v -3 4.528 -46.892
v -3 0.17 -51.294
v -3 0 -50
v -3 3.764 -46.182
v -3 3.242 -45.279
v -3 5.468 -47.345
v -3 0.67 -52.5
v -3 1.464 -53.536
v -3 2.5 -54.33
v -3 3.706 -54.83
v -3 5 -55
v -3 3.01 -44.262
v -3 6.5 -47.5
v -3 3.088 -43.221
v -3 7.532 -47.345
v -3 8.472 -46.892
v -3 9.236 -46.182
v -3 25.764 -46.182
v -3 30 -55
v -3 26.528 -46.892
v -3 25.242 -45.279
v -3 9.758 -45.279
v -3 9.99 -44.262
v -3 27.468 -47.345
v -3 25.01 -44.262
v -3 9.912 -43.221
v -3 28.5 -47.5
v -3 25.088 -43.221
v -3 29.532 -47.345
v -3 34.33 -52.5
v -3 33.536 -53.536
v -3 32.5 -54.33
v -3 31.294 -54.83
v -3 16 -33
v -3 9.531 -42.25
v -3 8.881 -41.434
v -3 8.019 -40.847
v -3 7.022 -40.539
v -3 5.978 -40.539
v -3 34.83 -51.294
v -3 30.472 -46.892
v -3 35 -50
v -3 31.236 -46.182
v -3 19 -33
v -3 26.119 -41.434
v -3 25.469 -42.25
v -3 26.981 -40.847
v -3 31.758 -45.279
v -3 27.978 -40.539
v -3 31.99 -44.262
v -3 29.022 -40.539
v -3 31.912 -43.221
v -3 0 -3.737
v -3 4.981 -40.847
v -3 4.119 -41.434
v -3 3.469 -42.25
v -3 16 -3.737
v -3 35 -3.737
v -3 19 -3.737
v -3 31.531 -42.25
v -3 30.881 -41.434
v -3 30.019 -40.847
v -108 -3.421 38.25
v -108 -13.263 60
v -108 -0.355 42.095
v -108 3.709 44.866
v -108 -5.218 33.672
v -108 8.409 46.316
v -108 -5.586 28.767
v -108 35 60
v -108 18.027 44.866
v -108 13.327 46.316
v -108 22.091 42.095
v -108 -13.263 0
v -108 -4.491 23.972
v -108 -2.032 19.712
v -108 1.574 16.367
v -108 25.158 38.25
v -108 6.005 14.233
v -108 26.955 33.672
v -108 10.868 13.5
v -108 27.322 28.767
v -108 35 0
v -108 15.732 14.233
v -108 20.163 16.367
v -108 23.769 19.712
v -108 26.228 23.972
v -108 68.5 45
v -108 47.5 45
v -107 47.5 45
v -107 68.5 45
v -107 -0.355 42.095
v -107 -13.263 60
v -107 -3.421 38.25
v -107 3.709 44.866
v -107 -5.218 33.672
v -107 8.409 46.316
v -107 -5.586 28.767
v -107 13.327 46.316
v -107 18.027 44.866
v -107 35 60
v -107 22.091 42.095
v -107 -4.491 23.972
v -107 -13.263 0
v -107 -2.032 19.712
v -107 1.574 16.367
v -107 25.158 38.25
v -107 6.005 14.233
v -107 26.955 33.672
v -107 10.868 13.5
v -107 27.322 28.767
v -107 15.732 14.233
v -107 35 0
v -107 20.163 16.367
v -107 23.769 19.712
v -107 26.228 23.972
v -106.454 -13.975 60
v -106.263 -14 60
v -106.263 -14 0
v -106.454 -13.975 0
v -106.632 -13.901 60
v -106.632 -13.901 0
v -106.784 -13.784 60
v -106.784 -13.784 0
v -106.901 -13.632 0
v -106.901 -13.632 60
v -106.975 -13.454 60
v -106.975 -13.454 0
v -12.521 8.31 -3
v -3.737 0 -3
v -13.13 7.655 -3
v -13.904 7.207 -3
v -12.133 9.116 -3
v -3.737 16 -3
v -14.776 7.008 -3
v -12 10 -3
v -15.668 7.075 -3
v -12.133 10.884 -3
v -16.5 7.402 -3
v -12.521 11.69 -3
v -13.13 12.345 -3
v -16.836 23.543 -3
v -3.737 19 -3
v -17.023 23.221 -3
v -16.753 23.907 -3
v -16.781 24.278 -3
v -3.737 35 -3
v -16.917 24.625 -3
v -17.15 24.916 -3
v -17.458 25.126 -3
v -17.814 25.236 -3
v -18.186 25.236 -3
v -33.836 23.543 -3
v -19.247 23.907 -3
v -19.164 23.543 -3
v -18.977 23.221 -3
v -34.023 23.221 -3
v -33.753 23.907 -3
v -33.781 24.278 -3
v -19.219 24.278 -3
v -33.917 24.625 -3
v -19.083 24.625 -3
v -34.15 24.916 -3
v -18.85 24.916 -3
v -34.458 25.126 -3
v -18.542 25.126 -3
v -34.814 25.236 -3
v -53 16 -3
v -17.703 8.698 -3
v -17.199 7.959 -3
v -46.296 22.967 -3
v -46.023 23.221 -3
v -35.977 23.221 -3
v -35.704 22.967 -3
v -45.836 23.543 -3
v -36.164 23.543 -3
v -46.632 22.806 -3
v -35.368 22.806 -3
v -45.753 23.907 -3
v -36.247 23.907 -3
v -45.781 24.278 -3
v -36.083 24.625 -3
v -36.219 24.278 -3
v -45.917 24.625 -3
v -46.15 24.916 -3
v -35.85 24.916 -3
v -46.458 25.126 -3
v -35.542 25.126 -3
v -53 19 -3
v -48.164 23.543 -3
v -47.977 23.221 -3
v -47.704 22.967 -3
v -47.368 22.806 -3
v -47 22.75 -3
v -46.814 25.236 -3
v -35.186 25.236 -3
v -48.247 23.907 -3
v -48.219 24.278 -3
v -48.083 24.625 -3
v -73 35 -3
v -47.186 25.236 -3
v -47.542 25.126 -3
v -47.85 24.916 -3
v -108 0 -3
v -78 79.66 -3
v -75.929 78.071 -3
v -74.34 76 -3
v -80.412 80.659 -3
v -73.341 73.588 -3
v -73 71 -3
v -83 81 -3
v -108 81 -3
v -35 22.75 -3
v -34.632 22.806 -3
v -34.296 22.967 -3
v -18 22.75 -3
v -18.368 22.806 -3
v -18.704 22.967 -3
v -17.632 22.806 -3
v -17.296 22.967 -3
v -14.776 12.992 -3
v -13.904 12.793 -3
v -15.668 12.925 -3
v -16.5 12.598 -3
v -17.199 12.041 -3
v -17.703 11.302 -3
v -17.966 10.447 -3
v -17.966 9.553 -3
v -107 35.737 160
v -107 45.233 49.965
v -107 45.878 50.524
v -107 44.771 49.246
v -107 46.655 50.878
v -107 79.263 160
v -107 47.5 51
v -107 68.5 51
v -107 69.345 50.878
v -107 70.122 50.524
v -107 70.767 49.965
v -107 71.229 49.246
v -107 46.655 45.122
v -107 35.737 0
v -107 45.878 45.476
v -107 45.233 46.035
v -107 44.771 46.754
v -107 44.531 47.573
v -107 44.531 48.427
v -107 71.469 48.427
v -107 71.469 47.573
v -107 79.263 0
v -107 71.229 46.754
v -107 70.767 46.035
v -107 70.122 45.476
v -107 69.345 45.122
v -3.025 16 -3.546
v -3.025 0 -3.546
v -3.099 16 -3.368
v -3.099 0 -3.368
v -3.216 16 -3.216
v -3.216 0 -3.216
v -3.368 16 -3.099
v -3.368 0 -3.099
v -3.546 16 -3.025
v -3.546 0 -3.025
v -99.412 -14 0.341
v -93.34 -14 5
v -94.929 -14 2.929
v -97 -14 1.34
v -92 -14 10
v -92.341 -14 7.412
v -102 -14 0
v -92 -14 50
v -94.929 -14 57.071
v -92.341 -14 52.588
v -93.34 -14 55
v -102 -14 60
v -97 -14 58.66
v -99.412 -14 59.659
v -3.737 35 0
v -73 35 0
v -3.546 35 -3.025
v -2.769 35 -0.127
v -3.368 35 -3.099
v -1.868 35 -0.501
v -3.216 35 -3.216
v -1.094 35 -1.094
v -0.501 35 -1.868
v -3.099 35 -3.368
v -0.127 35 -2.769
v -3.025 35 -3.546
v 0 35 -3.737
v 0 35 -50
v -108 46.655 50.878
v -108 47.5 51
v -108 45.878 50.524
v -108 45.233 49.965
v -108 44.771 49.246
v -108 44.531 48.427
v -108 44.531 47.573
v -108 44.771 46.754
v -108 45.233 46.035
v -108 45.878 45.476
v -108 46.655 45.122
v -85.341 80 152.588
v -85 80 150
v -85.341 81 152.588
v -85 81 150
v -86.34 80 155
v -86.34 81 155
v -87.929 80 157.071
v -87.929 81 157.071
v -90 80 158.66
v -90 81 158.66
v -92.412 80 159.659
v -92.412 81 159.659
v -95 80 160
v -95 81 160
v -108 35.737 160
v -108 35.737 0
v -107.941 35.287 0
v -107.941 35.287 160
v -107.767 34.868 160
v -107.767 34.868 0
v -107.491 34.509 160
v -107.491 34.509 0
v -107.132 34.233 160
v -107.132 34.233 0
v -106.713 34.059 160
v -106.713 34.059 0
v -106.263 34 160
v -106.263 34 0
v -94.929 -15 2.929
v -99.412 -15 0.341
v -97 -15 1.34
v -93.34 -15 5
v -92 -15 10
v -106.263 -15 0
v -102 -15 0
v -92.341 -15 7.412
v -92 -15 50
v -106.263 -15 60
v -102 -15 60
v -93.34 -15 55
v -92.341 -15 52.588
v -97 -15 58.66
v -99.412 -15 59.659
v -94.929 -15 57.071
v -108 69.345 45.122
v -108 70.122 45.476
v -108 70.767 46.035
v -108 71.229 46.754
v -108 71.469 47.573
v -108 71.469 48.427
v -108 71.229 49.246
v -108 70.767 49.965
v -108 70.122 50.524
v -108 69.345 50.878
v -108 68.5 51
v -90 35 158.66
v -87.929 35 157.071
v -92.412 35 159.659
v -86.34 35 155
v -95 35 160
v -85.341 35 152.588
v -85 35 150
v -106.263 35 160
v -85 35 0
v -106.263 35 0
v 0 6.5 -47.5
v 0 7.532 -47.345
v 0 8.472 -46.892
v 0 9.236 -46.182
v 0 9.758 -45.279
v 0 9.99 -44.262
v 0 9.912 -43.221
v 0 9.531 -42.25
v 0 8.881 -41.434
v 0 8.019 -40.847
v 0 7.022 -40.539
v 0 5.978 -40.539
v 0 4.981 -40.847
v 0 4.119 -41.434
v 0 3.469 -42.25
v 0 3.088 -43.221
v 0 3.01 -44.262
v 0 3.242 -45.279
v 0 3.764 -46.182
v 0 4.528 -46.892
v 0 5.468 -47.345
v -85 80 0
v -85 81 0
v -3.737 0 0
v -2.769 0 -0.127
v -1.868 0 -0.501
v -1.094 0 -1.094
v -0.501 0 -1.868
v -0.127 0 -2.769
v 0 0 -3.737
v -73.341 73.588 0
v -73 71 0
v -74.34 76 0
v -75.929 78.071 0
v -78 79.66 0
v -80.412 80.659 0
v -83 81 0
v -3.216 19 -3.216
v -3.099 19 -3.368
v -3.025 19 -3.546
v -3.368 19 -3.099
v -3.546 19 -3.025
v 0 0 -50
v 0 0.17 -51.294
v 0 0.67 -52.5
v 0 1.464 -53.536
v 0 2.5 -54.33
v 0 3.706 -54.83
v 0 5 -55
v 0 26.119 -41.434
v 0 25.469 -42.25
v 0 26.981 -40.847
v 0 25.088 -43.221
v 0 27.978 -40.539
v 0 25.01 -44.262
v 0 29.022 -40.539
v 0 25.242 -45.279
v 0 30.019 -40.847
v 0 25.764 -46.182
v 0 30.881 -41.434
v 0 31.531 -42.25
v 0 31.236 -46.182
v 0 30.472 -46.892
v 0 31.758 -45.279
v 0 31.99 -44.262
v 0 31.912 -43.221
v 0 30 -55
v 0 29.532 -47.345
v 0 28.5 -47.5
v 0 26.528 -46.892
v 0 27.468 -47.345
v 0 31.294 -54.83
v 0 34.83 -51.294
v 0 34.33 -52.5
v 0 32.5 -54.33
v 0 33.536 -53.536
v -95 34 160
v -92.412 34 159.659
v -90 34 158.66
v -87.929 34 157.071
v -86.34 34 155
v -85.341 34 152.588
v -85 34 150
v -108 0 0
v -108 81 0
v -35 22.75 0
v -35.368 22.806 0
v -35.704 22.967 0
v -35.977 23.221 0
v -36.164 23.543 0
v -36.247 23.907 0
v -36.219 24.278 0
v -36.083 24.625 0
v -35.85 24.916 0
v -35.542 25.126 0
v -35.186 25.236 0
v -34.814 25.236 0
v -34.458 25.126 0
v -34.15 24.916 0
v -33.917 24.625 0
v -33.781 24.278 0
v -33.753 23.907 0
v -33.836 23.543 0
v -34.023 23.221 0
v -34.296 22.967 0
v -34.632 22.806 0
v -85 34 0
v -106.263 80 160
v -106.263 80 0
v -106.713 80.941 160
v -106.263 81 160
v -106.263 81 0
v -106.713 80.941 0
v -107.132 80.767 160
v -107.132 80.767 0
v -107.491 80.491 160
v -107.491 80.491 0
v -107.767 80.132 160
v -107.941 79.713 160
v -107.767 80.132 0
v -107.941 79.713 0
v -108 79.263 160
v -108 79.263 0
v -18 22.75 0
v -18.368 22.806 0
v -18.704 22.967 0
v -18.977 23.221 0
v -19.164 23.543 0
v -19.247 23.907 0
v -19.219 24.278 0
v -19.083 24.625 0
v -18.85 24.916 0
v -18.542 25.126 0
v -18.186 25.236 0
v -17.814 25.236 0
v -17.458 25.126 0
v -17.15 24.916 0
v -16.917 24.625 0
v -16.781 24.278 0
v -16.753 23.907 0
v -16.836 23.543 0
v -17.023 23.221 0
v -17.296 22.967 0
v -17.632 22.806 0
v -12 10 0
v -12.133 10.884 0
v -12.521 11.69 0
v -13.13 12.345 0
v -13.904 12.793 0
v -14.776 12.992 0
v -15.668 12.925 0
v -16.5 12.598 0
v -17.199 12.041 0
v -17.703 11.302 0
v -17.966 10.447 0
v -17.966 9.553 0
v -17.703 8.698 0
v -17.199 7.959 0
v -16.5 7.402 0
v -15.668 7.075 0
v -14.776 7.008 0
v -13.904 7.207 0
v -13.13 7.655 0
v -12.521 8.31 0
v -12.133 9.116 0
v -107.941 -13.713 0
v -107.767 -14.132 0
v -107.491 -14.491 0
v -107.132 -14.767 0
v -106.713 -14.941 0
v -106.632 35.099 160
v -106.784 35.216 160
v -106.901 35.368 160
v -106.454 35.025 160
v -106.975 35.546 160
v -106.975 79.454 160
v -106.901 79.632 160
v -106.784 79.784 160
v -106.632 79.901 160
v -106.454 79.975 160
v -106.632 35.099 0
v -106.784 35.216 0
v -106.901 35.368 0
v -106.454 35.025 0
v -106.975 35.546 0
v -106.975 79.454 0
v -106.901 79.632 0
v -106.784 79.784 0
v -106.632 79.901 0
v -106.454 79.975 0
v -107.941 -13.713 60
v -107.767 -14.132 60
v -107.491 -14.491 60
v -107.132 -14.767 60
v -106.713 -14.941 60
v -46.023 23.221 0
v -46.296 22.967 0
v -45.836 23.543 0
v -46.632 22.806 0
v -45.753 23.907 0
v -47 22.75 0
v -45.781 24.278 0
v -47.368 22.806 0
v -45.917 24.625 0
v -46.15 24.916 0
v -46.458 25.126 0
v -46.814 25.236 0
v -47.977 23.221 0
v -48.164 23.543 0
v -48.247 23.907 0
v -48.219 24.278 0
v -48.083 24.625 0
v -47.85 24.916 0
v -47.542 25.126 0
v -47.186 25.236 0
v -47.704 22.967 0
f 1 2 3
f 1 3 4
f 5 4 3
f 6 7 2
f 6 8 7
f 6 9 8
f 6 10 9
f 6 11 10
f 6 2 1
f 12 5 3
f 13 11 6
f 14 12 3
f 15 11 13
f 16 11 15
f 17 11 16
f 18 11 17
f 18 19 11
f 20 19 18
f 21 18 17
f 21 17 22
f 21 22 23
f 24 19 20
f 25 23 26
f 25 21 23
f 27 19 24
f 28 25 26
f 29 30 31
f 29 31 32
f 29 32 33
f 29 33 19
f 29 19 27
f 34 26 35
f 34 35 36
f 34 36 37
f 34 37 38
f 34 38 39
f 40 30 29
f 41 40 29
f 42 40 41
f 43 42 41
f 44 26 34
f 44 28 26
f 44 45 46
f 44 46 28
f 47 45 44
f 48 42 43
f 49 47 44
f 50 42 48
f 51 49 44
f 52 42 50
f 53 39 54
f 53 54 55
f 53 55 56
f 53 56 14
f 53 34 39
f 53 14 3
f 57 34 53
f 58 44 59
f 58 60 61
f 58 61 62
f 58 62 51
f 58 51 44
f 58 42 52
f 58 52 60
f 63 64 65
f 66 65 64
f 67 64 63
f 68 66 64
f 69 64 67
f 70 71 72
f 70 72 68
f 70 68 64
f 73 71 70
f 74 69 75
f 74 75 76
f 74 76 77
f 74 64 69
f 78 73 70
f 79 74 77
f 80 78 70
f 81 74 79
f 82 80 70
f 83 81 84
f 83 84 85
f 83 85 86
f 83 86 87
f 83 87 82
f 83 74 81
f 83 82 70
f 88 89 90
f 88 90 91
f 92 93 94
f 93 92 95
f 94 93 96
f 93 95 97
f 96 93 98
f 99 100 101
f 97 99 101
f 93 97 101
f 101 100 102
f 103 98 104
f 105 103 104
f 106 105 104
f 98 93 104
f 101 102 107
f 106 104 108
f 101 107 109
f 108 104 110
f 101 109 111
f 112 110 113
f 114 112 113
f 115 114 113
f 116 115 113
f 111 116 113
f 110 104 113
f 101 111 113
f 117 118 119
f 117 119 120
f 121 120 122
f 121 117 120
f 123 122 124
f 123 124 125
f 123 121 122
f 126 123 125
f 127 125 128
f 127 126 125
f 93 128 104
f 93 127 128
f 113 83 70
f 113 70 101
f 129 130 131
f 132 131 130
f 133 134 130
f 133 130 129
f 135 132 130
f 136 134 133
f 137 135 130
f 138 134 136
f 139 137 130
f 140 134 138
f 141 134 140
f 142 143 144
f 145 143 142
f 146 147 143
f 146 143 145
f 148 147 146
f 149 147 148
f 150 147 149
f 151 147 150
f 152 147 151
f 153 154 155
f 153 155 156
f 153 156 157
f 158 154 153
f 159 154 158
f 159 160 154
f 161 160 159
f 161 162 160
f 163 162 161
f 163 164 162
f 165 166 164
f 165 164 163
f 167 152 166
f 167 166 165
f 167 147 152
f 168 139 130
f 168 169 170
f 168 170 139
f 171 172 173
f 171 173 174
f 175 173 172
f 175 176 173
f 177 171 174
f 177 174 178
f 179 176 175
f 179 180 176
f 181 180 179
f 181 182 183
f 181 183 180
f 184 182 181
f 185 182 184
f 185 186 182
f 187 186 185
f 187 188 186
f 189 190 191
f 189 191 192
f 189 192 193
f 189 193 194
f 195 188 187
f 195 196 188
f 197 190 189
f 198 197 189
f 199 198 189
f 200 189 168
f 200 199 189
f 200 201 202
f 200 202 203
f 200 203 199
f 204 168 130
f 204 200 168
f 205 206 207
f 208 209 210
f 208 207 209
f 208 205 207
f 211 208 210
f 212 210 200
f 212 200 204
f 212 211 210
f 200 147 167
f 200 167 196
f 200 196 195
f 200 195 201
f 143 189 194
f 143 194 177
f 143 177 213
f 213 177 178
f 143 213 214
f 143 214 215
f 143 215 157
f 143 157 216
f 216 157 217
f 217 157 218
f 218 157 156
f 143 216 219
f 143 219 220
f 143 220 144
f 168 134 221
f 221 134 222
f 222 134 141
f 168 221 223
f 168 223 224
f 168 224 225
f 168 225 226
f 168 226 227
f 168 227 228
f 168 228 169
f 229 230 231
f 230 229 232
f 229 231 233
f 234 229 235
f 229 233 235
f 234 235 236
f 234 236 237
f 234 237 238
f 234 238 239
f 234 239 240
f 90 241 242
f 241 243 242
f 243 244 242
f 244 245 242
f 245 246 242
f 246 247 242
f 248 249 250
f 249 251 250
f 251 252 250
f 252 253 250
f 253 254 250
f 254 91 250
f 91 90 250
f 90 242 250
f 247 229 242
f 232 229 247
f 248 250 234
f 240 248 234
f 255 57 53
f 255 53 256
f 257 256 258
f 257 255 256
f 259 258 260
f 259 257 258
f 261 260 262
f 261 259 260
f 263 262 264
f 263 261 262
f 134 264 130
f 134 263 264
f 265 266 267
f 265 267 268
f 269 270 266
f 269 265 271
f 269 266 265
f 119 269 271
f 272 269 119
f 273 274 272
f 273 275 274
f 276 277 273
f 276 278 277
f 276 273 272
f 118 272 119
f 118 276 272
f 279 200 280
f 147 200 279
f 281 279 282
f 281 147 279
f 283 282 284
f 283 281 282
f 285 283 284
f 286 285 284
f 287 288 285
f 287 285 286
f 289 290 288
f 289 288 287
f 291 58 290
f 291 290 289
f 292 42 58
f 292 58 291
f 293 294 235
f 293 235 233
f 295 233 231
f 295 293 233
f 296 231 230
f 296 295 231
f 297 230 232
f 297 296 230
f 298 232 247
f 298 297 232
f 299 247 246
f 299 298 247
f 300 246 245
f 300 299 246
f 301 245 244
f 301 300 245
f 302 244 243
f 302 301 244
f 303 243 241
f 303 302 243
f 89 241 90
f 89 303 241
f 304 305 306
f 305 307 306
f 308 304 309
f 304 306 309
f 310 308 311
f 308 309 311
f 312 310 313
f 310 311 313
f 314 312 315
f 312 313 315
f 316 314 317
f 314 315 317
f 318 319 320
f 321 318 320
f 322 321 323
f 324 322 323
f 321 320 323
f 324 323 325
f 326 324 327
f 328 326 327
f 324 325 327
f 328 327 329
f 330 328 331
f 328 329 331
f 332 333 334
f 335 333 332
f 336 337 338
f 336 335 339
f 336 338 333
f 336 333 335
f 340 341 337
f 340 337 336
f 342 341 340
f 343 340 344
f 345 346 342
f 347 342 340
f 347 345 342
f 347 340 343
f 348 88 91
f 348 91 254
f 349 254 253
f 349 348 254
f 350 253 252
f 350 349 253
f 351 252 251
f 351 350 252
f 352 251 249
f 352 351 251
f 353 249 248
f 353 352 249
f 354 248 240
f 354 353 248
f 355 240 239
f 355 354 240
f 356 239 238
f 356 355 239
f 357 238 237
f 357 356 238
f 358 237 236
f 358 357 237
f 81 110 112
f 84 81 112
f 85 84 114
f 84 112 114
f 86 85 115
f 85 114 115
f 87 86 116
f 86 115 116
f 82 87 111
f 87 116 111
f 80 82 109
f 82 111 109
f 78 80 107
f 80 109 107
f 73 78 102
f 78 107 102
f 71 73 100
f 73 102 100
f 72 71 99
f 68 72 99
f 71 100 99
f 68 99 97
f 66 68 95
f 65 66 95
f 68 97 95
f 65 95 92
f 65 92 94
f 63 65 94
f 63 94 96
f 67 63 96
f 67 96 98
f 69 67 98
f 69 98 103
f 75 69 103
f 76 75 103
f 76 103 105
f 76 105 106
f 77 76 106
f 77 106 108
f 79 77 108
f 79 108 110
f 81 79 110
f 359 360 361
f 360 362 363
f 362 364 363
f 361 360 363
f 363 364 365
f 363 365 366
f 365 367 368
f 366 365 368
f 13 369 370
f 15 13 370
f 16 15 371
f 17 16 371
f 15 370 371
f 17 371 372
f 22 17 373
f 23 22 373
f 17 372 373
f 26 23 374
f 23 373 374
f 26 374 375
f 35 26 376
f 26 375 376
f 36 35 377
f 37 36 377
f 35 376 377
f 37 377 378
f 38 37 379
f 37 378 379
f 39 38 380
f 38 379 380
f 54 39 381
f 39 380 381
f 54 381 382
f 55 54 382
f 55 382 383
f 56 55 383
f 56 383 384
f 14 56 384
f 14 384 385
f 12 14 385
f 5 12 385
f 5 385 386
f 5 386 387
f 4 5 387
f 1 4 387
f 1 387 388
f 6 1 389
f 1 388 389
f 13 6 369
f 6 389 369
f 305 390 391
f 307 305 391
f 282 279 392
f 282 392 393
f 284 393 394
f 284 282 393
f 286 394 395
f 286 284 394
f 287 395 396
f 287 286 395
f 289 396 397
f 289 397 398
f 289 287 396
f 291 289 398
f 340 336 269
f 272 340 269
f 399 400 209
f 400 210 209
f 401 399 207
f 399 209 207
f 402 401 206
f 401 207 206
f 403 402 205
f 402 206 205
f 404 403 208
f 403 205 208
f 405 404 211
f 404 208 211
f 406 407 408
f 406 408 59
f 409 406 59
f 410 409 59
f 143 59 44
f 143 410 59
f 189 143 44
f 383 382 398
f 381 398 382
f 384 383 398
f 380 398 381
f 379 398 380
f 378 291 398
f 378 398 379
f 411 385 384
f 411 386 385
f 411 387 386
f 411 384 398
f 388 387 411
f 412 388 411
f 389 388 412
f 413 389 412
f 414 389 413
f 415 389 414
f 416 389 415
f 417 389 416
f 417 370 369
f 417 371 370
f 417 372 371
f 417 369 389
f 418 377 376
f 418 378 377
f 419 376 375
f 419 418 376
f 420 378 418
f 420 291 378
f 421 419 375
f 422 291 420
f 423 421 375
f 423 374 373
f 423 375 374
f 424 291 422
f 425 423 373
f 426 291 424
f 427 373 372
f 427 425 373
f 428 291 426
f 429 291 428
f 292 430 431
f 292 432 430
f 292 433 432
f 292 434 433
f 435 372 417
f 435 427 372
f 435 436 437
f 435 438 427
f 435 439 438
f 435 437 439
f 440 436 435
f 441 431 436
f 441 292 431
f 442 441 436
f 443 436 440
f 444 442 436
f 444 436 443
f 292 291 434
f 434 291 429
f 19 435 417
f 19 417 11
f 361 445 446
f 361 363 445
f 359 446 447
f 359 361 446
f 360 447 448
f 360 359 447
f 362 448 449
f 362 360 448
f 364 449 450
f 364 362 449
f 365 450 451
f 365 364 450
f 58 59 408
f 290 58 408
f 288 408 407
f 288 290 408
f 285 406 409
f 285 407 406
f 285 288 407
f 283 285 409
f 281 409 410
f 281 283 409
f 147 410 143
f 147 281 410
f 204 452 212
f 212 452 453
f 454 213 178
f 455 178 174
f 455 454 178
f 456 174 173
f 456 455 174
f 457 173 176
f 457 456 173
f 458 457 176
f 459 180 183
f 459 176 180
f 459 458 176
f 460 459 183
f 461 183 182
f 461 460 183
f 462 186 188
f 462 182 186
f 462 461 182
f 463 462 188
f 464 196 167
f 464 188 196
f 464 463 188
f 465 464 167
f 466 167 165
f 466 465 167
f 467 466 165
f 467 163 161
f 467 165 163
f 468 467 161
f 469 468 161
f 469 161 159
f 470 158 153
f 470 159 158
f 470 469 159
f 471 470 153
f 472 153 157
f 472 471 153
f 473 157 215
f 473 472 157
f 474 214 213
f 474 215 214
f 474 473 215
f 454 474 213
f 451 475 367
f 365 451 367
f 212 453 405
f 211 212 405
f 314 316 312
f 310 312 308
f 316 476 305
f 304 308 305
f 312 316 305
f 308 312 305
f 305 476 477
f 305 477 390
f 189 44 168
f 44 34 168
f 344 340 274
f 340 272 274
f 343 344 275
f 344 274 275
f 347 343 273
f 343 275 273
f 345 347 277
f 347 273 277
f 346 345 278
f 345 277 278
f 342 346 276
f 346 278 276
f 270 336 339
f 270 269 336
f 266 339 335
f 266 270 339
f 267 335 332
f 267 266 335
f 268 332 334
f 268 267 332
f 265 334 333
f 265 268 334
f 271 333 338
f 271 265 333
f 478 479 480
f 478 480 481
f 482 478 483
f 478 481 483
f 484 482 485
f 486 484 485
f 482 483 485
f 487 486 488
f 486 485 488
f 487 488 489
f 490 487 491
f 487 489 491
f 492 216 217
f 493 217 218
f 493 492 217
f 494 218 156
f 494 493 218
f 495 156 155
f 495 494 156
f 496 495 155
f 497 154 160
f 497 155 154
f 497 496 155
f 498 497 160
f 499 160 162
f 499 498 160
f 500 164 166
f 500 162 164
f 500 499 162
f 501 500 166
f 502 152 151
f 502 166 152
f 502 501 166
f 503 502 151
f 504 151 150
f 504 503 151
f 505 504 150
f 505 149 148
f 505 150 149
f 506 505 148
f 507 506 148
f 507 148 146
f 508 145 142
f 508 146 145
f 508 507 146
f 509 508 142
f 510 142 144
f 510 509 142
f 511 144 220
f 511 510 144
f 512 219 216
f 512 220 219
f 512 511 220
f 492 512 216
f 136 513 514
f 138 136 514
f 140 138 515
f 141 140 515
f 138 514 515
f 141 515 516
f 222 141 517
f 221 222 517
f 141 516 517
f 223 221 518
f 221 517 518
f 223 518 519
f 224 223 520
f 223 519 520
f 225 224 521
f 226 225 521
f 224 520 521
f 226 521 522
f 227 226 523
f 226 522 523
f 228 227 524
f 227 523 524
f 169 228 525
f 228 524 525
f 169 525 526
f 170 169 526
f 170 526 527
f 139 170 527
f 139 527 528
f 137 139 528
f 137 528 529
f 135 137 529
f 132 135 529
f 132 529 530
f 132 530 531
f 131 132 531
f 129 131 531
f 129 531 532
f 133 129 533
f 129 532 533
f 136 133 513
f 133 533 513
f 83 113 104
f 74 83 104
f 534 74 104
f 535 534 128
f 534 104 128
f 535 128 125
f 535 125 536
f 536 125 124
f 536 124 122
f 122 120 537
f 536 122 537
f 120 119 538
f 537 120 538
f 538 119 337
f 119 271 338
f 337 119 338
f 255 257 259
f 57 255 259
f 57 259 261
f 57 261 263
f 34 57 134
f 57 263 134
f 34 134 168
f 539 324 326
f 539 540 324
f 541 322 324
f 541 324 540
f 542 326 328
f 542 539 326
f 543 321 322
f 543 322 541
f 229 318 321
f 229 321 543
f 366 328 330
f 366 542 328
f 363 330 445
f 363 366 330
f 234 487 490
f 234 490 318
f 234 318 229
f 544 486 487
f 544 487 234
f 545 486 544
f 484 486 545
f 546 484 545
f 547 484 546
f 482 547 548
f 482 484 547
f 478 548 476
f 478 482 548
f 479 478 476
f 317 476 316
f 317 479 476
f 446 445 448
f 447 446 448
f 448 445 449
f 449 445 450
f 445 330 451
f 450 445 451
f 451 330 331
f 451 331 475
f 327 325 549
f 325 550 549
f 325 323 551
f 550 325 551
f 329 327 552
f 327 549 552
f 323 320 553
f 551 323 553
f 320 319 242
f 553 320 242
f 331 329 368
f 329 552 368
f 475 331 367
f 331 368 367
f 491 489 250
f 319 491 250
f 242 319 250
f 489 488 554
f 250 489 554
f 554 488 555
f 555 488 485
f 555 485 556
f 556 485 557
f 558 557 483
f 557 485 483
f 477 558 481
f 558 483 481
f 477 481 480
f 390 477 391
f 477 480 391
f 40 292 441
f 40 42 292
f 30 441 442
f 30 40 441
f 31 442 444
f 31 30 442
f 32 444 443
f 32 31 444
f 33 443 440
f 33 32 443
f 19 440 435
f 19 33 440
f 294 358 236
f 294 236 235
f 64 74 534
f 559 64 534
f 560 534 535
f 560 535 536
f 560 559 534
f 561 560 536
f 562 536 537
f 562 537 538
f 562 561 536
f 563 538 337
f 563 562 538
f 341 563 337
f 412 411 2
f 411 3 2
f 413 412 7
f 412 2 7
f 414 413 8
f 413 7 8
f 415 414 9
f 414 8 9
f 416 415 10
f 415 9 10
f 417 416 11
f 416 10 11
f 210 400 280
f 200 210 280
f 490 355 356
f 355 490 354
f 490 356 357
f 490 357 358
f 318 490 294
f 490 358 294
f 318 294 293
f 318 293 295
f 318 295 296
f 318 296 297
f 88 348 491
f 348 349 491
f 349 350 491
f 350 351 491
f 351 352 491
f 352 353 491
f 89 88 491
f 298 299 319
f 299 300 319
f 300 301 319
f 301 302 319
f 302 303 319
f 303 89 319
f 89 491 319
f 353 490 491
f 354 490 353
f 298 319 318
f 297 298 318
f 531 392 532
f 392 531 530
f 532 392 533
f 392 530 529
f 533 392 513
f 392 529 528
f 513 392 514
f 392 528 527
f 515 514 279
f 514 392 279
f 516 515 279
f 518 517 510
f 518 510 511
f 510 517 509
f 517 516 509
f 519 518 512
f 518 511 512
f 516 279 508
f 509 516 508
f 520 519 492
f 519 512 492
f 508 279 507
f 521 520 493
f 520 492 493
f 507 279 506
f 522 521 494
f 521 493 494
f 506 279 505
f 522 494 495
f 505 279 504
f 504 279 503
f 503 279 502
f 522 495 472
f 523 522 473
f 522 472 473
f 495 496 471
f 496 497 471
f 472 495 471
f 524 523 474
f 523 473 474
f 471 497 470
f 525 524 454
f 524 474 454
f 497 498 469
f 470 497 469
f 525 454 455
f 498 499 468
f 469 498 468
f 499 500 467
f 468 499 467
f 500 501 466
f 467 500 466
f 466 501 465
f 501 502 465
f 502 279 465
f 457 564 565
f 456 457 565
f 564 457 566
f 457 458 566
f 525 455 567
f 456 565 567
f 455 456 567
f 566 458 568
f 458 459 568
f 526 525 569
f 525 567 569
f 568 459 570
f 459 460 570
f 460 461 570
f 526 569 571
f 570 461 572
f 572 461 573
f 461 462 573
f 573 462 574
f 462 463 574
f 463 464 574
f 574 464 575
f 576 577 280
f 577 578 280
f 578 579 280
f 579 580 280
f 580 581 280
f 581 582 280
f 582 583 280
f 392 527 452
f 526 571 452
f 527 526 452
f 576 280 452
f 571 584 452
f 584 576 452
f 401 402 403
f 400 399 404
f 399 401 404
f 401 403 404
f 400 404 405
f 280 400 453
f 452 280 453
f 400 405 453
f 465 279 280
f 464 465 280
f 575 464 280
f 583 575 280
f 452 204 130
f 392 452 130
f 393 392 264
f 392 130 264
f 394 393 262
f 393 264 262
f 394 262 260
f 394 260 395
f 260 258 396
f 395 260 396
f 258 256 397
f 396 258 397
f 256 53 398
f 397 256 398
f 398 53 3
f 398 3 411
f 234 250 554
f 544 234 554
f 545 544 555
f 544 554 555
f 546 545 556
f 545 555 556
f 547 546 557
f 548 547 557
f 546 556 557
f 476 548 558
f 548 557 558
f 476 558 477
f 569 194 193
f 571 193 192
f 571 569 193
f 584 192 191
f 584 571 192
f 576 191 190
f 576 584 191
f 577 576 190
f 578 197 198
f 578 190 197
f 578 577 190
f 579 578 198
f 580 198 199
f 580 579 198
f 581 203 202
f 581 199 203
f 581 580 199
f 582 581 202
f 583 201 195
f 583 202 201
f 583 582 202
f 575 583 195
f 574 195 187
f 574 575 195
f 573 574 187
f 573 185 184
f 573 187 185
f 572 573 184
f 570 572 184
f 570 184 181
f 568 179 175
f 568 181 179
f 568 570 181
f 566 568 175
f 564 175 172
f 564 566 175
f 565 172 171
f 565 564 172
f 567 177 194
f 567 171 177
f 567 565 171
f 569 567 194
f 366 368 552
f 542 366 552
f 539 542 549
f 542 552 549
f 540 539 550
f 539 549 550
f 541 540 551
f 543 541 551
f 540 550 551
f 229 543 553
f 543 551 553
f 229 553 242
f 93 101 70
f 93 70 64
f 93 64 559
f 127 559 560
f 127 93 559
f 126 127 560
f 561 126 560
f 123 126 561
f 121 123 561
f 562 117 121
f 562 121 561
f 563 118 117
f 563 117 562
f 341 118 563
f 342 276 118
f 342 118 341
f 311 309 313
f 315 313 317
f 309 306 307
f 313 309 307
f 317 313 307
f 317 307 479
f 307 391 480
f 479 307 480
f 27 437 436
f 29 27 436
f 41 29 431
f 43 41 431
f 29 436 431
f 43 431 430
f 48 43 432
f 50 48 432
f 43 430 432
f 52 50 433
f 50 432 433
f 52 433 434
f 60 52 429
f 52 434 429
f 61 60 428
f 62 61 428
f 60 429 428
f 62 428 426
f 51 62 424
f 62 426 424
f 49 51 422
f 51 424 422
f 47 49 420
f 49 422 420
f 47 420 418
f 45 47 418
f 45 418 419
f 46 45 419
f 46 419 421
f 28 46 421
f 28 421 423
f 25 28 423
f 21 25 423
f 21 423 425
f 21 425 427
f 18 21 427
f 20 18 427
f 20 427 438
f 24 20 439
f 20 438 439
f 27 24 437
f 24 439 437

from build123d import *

# Parameters (mm, degrees)
SM_BASE_FLANGE_1_DEPTH           = 3
SM_EDGE_FLANGE_1_STRIP_W         = 13.4732
SM_EDGE_FLANGE_1_STRIP_H         = 3
SM_EDGE_FLANGE_1_STRIP_CUT_DEPTH = 35
SM_EDGE_FLANGE_1_DEPTH           = 35
SM_BASE_FLANGE_2_DEPTH           = 160
CUT_EXTRUDE_3_DEPTH              = 10
EXTRUDE_START                    = -17.5
EXTRUDE_1_DEPTH                  = 1.5
FILLET_3_R                       = 10
SKETCH_15_R                      = 3.5
CUT_EXTRUDE_5_DEPTH              = 3
FILLET_4_R                       = 5
HOLE_WIZARD_M3_1_AT_2_COUNT      = 2
HOLE_WIZARD_M3_1_AT_2_PITCH      = 12
HOLE_WIZARD_M3_1_AT_3_COUNT      = 2
HOLE_WIZARD_M3_1_AT_3_PITCH      = 29
SKETCH_18_R                      = 3
CUT_EXTRUDE_6_DEPTH              = 3
SKETCH_20_W                      = 1
SKETCH_20_H                      = 50
SM_BASE_FLANGE_3_DEPTH           = 60
SM_EDGE_FLANGE_2_STRIP_W         = 5.4732
SM_EDGE_FLANGE_2_STRIP_H         = 1
SM_EDGE_FLANGE_2_STRIP_CUT_DEPTH = 60
SM_EDGE_FLANGE_2_DEPTH           = 60
SKETCH_28_R                      = 16.5
CUT_EXTRUDE_7_DEPTH              = 10
FILLET_5_R                       = 10
FILLET_6_R                       = 10


# Sheet-metal steps are written as plain solids
with BuildPart() as part:
    # Sketch 1 → 基体-法兰1 (new body)
    with BuildSketch(Plane.XY):
        Polygon((0, 0), (-108, 0), (-108, 81), (-73, 81), (-73, 35), (0, 35), align=None)
    extrude(amount=-SM_BASE_FLANGE_1_DEPTH)

    # 边线-法兰1 strip (across the edge) → 边线-法兰1 strip cut (cut)
    with BuildSketch(Plane(origin=(0, 35, -3), x_dir=(-1, 0, 0), z_dir=(0, -1, 0))):
        with Locations((-3, -1.5)):
            Rectangle(SM_EDGE_FLANGE_1_STRIP_W, SM_EDGE_FLANGE_1_STRIP_H)
    extrude(amount=SM_EDGE_FLANGE_1_STRIP_CUT_DEPTH, mode=Mode.SUBTRACT)

    # 边线-法兰1 section (across the edge) → 边线-法兰1 (add)
    with BuildSketch(Plane(origin=(0, 35, -3), x_dir=(-1, 0, 0), z_dir=(0, -1, 0))):
        with BuildLine():
            Line((0, 0.7366), (0, 52))
            Line((0, 52), (3, 52))
            Line((3, 52), (3, 0.7366))
            ThreePointArc((3, 0.7366), (3.215745145, 0.215745145), (3.7366, 0))
            Line((3.7366, 0), (3.7366, -3))
            ThreePointArc((3.7366, -3), (1.094424801, -1.905575199), (0, 0.7366))
        make_face()
    extrude(amount=SM_EDGE_FLANGE_1_DEPTH)

    # 草图14 → 凸台-拉伸1 (add, symmetric)
    with BuildSketch(Plane.XZ.offset(EXTRUDE_START)):
        with BuildLine():
            Line((-3, -3.7366), (-3, -33))
            Line((-3, -33), (-53, -3))
            Line((-53, -3), (-3.7366, -3))
            ThreePointArc((-3.7366, -3), (-3.215745145, -3.215745145), (-3, -3.7366))
        make_face()
    extrude(amount=EXTRUDE_1_DEPTH, both=True)

    # 草图15 → 切除-拉伸5 (cut)
    with BuildSketch(Plane(origin=(0, 0, 0), x_dir=(0, 0, -1), z_dir=(1, 0, 0))):
        with Locations((44, 6.5)):
            Circle(SKETCH_15_R)
        with Locations((44, 28.5)):
            Circle(SKETCH_15_R)
    extrude(amount=-CUT_EXTRUDE_5_DEPTH, mode=Mode.SUBTRACT)

    # 圆角4
    fillet_4_edges = [part.edges().sort_by_distance(p)[0] for p in [
        (-1.5, 35, -55),
        (-1.5, 0, -55),
    ]]
    fillet(fillet_4_edges, radius=FILLET_4_R)

    # 草图16 → M3 螺纹孔1 (revolve, cut)
    with BuildSketch(Plane(origin=(-47, 24, 0), x_dir=(0, -1, 0), z_dir=(1, 0, 0))):
        Polygon((0, 0), (0, 8.251075774), (1.25, 7.5), (1.25, 0), align=None)
    hole_wizard_m3_1 = revolve(axis=Axis((-47, 24, 6.35), (0, 0, -1)), mode=Mode.SUBTRACT)

    # M3 螺纹孔1 at 2: M3 螺纹孔1 ×2
    with Locations(*[(i * HOLE_WIZARD_M3_1_AT_2_PITCH, 0, 0) for i in range(1, HOLE_WIZARD_M3_1_AT_2_COUNT)]):
        add(hole_wizard_m3_1, mode=Mode.SUBTRACT)

    # M3 螺纹孔1 at 3: M3 螺纹孔1 ×2
    with Locations(*[(i * HOLE_WIZARD_M3_1_AT_3_PITCH, 0, 0) for i in range(1, HOLE_WIZARD_M3_1_AT_3_COUNT)]):
        add(hole_wizard_m3_1, mode=Mode.SUBTRACT)

    # 草图18 → 切除-拉伸6 (cut)
    with BuildSketch(Plane.XY):
        with Locations((-15, 10)):
            Circle(SKETCH_18_R)
    extrude(amount=-CUT_EXTRUDE_6_DEPTH, mode=Mode.SUBTRACT)

    # 圆角6
    fillet_6_edges = [part.edges().sort_by_distance(p)[0] for p in [
        (-73, 81, -1.5),
    ]]
    fillet(fillet_6_edges, radius=FILLET_6_R)


with BuildPart() as body_2:
    # 草图6 → 基体-法兰2 (new body)
    with BuildSketch(Plane.XY):
        with BuildLine():
            Line((-85, 81), (-106.2634, 81))
            ThreePointArc((-106.2634, 81), (-107.491361636, 80.491361636), (-108, 79.2634))
            Line((-108, 79.2634), (-108, 35.7366))
            ThreePointArc((-108, 35.7366), (-107.491361636, 34.508638364), (-106.2634, 34))
            Line((-106.2634, 34), (-85, 34))
            Line((-85, 34), (-85, 35))
            Line((-85, 35), (-106.2634, 35))
            ThreePointArc((-106.2634, 35), (-106.784254855, 35.215745145), (-107, 35.7366))
            Line((-107, 35.7366), (-107, 79.2634))
            ThreePointArc((-107, 79.2634), (-106.784254855, 79.784254855), (-106.2634, 80))
            Line((-106.2634, 80), (-85, 80))
            Line((-85, 80), (-85, 81))
        make_face()
    extrude(amount=SM_BASE_FLANGE_2_DEPTH)

    # 草图12 → 切除-拉伸3 (cut)
    with BuildSketch(Plane.ZY.offset(108)):
        with BuildLine():
            Line((51, 68.5), (51, 47.5))
            ThreePointArc((51, 47.5), (48, 44.5), (45, 47.5))
            Line((45, 47.5), (45, 68.5))
            ThreePointArc((45, 68.5), (48, 71.5), (51, 68.5))
        make_face()
    extrude(amount=-CUT_EXTRUDE_3_DEPTH, mode=Mode.SUBTRACT)

    # 圆角3
    fillet_3_edges = [body_2.edges().sort_by_distance(p)[0] for p in [
        (-85, 80.5, 160),
        (-85, 34.5, 160),
    ]]
    fillet(fillet_3_edges, radius=FILLET_3_R)


with BuildPart() as body_3:
    # 草图20 → 基体-法兰3 (new body)
    with BuildSketch(Plane.XY):
        with Locations((-107.5, 10)):
            Rectangle(SKETCH_20_W, SKETCH_20_H)
    extrude(amount=SM_BASE_FLANGE_3_DEPTH)

    # 边线-法兰2 strip (across the edge) → 边线-法兰2 strip cut (cut)
    with BuildSketch(Plane(origin=(-107, -15, 60), x_dir=(0, 1, 0), z_dir=(0, 0, -1))):
        with Locations((-1, -0.5)):
            Rectangle(SM_EDGE_FLANGE_2_STRIP_W, SM_EDGE_FLANGE_2_STRIP_H)
    extrude(amount=SM_EDGE_FLANGE_2_STRIP_CUT_DEPTH, mode=Mode.SUBTRACT)

    # 边线-法兰2 section (across the edge) → 边线-法兰2 (add)
    with BuildSketch(Plane(origin=(-107, -15, 60), x_dir=(0, 1, 0), z_dir=(0, 0, -1))):
        with BuildLine():
            Line((0, 0.7366), (0, 15))
            Line((0, 15), (1, 15))
            Line((1, 15), (1, 0.7366))
            ThreePointArc((1, 0.7366), (1.215745145, 0.215745145), (1.7366, 0))
            Line((1.7366, 0), (1.7366, -1))
            ThreePointArc((1.7366, -1), (0.508638364, -0.491361636), (0, 0.7366))
        make_face()
    extrude(amount=SM_EDGE_FLANGE_2_DEPTH)

    # 草图28 → 切除-拉伸7 (cut)
    with BuildSketch(Plane(origin=(-107, 0, 0), x_dir=(0, 0, -1), z_dir=(1, 0, 0))):
        with Locations((-30, 10.8683)):
            Circle(SKETCH_28_R)
    extrude(amount=-CUT_EXTRUDE_7_DEPTH, mode=Mode.SUBTRACT)

    # 圆角5
    fillet_5_edges = [body_3.edges().sort_by_distance(p)[0] for p in [
        (-92, -14.5, 60),
        (-92, -14.5, 0),
    ]]
    fillet(fillet_5_edges, radius=FILLET_5_R)


solid = Compound([part.part, body_2.part, body_3.part])
